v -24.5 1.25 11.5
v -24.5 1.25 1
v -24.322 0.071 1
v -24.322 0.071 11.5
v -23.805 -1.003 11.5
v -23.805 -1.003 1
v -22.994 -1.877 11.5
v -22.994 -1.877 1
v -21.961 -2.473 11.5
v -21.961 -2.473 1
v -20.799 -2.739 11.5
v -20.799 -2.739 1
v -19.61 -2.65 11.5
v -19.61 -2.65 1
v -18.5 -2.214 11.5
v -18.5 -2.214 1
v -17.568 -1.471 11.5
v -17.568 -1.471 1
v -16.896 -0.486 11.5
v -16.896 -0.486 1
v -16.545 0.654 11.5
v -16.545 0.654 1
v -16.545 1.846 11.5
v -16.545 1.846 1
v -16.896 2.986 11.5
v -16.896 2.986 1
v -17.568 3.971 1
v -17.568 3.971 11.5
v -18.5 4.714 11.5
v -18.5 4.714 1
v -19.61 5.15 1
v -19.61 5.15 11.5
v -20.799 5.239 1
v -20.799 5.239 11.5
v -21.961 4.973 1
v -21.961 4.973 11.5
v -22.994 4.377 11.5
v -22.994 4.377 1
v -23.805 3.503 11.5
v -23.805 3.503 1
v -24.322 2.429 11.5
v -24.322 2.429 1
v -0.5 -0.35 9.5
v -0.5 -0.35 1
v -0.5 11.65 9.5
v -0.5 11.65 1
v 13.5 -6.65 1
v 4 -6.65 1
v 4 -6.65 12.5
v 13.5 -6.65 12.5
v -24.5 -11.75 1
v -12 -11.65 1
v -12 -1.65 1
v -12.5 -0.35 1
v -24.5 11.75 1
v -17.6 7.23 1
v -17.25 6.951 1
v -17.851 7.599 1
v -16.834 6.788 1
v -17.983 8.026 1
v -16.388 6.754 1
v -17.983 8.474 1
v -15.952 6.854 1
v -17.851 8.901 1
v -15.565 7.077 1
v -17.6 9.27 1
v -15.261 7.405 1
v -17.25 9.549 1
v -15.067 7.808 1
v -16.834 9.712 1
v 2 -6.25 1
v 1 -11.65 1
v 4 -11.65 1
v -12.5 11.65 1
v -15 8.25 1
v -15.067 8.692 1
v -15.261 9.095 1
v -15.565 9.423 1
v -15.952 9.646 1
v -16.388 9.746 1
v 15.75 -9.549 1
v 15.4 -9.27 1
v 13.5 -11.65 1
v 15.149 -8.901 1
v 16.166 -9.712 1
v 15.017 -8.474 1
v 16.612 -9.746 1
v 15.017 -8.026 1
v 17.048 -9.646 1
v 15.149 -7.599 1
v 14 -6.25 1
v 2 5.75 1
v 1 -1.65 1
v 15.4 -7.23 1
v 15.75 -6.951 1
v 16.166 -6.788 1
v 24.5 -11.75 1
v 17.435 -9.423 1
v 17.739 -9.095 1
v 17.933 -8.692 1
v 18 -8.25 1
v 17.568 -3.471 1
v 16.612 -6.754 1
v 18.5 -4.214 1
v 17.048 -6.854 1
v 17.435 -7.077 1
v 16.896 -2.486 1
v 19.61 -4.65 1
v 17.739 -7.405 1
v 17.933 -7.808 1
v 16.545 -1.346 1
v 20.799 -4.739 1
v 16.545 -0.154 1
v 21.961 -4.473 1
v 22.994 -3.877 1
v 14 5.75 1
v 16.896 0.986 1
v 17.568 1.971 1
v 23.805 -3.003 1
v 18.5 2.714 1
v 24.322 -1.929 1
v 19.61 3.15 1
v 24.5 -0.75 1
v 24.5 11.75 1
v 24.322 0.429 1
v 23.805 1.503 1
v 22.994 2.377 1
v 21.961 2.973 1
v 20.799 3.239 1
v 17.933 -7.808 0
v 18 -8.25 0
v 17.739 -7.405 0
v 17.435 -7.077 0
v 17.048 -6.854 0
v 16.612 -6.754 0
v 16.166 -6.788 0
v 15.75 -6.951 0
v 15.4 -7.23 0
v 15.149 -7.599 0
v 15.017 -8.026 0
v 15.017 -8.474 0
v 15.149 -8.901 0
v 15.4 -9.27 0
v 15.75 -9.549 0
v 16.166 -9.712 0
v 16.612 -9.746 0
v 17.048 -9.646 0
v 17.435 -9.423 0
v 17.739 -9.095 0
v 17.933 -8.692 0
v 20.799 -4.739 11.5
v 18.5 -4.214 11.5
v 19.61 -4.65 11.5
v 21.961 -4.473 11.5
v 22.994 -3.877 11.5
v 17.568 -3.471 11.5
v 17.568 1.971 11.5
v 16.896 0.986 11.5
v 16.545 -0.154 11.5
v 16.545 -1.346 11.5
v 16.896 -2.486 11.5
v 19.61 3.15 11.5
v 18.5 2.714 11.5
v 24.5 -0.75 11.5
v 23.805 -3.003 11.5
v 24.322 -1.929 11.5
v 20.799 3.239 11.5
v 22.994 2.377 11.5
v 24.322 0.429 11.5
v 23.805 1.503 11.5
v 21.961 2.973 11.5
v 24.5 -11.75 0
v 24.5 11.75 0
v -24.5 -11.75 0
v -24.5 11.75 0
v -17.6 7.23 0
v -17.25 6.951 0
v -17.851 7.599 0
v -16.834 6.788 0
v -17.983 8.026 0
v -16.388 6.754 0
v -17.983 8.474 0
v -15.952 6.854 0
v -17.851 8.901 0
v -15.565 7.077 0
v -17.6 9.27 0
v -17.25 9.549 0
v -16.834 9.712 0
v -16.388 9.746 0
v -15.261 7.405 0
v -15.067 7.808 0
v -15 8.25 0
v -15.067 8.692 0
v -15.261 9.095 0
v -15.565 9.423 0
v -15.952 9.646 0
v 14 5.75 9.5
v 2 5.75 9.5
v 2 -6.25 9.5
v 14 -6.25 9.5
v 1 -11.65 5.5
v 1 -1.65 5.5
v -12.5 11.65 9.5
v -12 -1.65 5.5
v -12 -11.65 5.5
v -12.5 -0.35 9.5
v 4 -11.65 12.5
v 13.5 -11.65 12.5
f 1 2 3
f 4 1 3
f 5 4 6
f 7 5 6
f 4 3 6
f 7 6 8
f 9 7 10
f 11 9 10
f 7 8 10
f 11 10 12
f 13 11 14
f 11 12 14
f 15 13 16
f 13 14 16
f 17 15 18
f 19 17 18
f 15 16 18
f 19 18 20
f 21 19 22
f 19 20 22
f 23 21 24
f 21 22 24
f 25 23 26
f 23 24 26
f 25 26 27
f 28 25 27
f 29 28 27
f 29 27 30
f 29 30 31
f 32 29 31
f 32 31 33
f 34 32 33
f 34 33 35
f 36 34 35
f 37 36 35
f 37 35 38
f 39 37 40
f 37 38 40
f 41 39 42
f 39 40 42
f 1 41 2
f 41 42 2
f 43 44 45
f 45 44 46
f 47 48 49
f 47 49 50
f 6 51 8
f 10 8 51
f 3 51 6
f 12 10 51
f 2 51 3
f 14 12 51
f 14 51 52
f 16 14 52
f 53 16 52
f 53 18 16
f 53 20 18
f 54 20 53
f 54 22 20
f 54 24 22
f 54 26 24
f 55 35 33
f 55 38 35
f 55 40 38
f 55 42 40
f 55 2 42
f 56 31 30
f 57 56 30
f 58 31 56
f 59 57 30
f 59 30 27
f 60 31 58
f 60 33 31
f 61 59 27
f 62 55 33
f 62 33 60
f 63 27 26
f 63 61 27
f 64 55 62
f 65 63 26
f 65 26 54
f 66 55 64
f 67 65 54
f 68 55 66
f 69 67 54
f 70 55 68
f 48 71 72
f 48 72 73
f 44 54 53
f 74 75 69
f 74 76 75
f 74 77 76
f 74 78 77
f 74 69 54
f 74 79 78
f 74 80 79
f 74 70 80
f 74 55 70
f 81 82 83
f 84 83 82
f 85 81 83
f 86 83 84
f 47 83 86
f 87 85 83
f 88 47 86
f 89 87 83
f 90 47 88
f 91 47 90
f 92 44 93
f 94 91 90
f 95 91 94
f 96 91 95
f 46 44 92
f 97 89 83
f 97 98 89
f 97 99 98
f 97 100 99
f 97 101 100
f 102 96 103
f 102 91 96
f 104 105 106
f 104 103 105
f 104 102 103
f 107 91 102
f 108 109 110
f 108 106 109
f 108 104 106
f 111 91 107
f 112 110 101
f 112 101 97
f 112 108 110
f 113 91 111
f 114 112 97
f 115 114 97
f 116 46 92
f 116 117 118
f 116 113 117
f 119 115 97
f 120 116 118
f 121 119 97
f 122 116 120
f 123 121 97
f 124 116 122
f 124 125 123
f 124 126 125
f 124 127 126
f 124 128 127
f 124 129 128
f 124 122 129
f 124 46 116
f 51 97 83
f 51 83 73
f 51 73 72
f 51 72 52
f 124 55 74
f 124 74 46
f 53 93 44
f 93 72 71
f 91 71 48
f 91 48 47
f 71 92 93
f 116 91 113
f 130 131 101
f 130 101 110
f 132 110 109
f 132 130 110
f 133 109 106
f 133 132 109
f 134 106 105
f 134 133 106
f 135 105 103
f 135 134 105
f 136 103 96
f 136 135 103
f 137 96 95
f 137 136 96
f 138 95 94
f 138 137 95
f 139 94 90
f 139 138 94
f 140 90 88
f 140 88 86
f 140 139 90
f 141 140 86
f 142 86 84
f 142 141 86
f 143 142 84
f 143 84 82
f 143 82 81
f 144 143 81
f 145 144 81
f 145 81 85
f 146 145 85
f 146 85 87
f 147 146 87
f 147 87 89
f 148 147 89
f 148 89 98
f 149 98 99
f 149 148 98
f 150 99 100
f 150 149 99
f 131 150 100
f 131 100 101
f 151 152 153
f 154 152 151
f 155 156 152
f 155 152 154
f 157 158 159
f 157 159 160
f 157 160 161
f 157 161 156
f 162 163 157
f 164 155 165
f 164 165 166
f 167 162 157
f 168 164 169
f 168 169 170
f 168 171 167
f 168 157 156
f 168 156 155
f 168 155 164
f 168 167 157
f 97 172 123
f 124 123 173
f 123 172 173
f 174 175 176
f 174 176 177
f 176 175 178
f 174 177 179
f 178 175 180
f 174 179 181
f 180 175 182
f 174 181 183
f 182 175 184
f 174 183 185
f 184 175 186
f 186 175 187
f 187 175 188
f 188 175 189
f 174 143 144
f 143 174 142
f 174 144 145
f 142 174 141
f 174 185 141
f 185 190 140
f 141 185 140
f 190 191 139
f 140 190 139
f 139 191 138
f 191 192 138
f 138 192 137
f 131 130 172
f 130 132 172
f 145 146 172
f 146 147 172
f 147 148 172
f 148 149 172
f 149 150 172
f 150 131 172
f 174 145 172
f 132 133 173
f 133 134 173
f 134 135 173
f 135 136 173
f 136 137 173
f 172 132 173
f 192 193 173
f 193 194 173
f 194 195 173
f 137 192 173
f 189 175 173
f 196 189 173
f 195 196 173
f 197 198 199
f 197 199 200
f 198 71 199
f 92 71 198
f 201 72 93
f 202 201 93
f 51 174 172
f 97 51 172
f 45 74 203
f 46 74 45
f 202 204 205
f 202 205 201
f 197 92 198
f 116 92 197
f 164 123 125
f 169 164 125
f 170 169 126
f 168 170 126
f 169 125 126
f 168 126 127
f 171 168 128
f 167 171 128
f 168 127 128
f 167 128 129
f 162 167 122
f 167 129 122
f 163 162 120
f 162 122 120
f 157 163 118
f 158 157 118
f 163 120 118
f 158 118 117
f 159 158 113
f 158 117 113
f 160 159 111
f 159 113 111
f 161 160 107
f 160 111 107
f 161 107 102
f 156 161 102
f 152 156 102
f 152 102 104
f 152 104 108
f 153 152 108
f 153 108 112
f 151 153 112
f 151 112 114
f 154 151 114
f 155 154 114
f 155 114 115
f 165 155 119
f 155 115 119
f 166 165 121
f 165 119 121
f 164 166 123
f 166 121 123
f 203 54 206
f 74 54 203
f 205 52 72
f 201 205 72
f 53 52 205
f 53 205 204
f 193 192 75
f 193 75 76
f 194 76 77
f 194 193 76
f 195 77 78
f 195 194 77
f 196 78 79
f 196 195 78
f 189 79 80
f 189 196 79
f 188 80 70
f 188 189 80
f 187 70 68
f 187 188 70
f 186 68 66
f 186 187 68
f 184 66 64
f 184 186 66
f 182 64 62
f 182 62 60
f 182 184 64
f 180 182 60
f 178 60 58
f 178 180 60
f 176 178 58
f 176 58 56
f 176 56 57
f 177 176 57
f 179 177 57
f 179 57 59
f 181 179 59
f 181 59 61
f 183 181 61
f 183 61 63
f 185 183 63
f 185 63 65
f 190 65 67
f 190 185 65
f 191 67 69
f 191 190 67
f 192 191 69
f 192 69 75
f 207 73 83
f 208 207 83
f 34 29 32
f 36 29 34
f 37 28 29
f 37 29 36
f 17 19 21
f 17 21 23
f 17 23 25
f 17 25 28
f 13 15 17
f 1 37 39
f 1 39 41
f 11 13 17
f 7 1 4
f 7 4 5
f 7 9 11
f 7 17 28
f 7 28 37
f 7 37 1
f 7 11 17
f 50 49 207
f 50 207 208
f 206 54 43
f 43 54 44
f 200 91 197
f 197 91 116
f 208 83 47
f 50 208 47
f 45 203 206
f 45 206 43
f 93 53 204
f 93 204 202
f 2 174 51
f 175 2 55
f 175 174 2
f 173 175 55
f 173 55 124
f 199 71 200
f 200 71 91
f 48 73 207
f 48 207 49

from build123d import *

# Parameters (mm, degrees)
SKETCH_1_W         = 49
SKETCH_1_H         = 23.5
SKETCH_1_R         = 1.5
EXTRUDE_512_DEPTH  = 1
SKETCH_2_R         = 4
EXTRUDE_1244_DEPTH = 10.5
SKETCH_2_3_W       = 9.5
SKETCH_2_3_H       = 5
EXTRUDE_1289_DEPTH = 11.5
SKETCH_2_5_W       = 12
SKETCH_2_5_H       = 12
EXTRUDE_1429_DEPTH = 8.5
SKETCH_2_6_W       = 13
SKETCH_2_6_H       = 10
EXTRUDE_1653_DEPTH = 4.5


with BuildPart() as part:
    # Эскиз1 → Extrude 512 (new body)
    with BuildSketch(Plane.XY):
        Rectangle(SKETCH_1_W, SKETCH_1_H)
        with Locations((-16.5, 8.25)):
            Circle(SKETCH_1_R, mode=Mode.SUBTRACT)
        with Locations((16.5, -8.25)):
            Circle(SKETCH_1_R, mode=Mode.SUBTRACT)
    extrude(amount=EXTRUDE_512_DEPTH)

    # Эскиз2 → Extrude 1244 (add)
    with BuildSketch(Plane.XY.offset(1)):
        with Locations((-20.5, 1.25)):
            Circle(SKETCH_2_R)
        with Locations((20.5, -0.75)):
            Circle(SKETCH_2_R)
    extrude(amount=EXTRUDE_1244_DEPTH)

    # Эскиз2<3> → Extrude 1289 (add)
    with BuildSketch(Plane.XY.offset(1)):
        with Locations((8.75, -9.15)):
            Rectangle(SKETCH_2_3_W, SKETCH_2_3_H)
    extrude(amount=EXTRUDE_1289_DEPTH)

    # Эскиз2<5> → Extrude 1429 (add)
    with BuildSketch(Plane.XY.offset(1)):
        with Locations((-6.5, 5.65)):
            Rectangle(SKETCH_2_5_W, SKETCH_2_5_H)
        with Locations((8, -0.25)):
            Rectangle(SKETCH_2_5_W, SKETCH_2_5_H)
    extrude(amount=EXTRUDE_1429_DEPTH)

    # Эскиз2<6> → Extrude 1653 (add)
    with BuildSketch(Plane.XY.offset(1)):
        with Locations((-5.5, -6.65)):
            Rectangle(SKETCH_2_6_W, SKETCH_2_6_H)
    extrude(amount=EXTRUDE_1653_DEPTH)


solid = part.part
